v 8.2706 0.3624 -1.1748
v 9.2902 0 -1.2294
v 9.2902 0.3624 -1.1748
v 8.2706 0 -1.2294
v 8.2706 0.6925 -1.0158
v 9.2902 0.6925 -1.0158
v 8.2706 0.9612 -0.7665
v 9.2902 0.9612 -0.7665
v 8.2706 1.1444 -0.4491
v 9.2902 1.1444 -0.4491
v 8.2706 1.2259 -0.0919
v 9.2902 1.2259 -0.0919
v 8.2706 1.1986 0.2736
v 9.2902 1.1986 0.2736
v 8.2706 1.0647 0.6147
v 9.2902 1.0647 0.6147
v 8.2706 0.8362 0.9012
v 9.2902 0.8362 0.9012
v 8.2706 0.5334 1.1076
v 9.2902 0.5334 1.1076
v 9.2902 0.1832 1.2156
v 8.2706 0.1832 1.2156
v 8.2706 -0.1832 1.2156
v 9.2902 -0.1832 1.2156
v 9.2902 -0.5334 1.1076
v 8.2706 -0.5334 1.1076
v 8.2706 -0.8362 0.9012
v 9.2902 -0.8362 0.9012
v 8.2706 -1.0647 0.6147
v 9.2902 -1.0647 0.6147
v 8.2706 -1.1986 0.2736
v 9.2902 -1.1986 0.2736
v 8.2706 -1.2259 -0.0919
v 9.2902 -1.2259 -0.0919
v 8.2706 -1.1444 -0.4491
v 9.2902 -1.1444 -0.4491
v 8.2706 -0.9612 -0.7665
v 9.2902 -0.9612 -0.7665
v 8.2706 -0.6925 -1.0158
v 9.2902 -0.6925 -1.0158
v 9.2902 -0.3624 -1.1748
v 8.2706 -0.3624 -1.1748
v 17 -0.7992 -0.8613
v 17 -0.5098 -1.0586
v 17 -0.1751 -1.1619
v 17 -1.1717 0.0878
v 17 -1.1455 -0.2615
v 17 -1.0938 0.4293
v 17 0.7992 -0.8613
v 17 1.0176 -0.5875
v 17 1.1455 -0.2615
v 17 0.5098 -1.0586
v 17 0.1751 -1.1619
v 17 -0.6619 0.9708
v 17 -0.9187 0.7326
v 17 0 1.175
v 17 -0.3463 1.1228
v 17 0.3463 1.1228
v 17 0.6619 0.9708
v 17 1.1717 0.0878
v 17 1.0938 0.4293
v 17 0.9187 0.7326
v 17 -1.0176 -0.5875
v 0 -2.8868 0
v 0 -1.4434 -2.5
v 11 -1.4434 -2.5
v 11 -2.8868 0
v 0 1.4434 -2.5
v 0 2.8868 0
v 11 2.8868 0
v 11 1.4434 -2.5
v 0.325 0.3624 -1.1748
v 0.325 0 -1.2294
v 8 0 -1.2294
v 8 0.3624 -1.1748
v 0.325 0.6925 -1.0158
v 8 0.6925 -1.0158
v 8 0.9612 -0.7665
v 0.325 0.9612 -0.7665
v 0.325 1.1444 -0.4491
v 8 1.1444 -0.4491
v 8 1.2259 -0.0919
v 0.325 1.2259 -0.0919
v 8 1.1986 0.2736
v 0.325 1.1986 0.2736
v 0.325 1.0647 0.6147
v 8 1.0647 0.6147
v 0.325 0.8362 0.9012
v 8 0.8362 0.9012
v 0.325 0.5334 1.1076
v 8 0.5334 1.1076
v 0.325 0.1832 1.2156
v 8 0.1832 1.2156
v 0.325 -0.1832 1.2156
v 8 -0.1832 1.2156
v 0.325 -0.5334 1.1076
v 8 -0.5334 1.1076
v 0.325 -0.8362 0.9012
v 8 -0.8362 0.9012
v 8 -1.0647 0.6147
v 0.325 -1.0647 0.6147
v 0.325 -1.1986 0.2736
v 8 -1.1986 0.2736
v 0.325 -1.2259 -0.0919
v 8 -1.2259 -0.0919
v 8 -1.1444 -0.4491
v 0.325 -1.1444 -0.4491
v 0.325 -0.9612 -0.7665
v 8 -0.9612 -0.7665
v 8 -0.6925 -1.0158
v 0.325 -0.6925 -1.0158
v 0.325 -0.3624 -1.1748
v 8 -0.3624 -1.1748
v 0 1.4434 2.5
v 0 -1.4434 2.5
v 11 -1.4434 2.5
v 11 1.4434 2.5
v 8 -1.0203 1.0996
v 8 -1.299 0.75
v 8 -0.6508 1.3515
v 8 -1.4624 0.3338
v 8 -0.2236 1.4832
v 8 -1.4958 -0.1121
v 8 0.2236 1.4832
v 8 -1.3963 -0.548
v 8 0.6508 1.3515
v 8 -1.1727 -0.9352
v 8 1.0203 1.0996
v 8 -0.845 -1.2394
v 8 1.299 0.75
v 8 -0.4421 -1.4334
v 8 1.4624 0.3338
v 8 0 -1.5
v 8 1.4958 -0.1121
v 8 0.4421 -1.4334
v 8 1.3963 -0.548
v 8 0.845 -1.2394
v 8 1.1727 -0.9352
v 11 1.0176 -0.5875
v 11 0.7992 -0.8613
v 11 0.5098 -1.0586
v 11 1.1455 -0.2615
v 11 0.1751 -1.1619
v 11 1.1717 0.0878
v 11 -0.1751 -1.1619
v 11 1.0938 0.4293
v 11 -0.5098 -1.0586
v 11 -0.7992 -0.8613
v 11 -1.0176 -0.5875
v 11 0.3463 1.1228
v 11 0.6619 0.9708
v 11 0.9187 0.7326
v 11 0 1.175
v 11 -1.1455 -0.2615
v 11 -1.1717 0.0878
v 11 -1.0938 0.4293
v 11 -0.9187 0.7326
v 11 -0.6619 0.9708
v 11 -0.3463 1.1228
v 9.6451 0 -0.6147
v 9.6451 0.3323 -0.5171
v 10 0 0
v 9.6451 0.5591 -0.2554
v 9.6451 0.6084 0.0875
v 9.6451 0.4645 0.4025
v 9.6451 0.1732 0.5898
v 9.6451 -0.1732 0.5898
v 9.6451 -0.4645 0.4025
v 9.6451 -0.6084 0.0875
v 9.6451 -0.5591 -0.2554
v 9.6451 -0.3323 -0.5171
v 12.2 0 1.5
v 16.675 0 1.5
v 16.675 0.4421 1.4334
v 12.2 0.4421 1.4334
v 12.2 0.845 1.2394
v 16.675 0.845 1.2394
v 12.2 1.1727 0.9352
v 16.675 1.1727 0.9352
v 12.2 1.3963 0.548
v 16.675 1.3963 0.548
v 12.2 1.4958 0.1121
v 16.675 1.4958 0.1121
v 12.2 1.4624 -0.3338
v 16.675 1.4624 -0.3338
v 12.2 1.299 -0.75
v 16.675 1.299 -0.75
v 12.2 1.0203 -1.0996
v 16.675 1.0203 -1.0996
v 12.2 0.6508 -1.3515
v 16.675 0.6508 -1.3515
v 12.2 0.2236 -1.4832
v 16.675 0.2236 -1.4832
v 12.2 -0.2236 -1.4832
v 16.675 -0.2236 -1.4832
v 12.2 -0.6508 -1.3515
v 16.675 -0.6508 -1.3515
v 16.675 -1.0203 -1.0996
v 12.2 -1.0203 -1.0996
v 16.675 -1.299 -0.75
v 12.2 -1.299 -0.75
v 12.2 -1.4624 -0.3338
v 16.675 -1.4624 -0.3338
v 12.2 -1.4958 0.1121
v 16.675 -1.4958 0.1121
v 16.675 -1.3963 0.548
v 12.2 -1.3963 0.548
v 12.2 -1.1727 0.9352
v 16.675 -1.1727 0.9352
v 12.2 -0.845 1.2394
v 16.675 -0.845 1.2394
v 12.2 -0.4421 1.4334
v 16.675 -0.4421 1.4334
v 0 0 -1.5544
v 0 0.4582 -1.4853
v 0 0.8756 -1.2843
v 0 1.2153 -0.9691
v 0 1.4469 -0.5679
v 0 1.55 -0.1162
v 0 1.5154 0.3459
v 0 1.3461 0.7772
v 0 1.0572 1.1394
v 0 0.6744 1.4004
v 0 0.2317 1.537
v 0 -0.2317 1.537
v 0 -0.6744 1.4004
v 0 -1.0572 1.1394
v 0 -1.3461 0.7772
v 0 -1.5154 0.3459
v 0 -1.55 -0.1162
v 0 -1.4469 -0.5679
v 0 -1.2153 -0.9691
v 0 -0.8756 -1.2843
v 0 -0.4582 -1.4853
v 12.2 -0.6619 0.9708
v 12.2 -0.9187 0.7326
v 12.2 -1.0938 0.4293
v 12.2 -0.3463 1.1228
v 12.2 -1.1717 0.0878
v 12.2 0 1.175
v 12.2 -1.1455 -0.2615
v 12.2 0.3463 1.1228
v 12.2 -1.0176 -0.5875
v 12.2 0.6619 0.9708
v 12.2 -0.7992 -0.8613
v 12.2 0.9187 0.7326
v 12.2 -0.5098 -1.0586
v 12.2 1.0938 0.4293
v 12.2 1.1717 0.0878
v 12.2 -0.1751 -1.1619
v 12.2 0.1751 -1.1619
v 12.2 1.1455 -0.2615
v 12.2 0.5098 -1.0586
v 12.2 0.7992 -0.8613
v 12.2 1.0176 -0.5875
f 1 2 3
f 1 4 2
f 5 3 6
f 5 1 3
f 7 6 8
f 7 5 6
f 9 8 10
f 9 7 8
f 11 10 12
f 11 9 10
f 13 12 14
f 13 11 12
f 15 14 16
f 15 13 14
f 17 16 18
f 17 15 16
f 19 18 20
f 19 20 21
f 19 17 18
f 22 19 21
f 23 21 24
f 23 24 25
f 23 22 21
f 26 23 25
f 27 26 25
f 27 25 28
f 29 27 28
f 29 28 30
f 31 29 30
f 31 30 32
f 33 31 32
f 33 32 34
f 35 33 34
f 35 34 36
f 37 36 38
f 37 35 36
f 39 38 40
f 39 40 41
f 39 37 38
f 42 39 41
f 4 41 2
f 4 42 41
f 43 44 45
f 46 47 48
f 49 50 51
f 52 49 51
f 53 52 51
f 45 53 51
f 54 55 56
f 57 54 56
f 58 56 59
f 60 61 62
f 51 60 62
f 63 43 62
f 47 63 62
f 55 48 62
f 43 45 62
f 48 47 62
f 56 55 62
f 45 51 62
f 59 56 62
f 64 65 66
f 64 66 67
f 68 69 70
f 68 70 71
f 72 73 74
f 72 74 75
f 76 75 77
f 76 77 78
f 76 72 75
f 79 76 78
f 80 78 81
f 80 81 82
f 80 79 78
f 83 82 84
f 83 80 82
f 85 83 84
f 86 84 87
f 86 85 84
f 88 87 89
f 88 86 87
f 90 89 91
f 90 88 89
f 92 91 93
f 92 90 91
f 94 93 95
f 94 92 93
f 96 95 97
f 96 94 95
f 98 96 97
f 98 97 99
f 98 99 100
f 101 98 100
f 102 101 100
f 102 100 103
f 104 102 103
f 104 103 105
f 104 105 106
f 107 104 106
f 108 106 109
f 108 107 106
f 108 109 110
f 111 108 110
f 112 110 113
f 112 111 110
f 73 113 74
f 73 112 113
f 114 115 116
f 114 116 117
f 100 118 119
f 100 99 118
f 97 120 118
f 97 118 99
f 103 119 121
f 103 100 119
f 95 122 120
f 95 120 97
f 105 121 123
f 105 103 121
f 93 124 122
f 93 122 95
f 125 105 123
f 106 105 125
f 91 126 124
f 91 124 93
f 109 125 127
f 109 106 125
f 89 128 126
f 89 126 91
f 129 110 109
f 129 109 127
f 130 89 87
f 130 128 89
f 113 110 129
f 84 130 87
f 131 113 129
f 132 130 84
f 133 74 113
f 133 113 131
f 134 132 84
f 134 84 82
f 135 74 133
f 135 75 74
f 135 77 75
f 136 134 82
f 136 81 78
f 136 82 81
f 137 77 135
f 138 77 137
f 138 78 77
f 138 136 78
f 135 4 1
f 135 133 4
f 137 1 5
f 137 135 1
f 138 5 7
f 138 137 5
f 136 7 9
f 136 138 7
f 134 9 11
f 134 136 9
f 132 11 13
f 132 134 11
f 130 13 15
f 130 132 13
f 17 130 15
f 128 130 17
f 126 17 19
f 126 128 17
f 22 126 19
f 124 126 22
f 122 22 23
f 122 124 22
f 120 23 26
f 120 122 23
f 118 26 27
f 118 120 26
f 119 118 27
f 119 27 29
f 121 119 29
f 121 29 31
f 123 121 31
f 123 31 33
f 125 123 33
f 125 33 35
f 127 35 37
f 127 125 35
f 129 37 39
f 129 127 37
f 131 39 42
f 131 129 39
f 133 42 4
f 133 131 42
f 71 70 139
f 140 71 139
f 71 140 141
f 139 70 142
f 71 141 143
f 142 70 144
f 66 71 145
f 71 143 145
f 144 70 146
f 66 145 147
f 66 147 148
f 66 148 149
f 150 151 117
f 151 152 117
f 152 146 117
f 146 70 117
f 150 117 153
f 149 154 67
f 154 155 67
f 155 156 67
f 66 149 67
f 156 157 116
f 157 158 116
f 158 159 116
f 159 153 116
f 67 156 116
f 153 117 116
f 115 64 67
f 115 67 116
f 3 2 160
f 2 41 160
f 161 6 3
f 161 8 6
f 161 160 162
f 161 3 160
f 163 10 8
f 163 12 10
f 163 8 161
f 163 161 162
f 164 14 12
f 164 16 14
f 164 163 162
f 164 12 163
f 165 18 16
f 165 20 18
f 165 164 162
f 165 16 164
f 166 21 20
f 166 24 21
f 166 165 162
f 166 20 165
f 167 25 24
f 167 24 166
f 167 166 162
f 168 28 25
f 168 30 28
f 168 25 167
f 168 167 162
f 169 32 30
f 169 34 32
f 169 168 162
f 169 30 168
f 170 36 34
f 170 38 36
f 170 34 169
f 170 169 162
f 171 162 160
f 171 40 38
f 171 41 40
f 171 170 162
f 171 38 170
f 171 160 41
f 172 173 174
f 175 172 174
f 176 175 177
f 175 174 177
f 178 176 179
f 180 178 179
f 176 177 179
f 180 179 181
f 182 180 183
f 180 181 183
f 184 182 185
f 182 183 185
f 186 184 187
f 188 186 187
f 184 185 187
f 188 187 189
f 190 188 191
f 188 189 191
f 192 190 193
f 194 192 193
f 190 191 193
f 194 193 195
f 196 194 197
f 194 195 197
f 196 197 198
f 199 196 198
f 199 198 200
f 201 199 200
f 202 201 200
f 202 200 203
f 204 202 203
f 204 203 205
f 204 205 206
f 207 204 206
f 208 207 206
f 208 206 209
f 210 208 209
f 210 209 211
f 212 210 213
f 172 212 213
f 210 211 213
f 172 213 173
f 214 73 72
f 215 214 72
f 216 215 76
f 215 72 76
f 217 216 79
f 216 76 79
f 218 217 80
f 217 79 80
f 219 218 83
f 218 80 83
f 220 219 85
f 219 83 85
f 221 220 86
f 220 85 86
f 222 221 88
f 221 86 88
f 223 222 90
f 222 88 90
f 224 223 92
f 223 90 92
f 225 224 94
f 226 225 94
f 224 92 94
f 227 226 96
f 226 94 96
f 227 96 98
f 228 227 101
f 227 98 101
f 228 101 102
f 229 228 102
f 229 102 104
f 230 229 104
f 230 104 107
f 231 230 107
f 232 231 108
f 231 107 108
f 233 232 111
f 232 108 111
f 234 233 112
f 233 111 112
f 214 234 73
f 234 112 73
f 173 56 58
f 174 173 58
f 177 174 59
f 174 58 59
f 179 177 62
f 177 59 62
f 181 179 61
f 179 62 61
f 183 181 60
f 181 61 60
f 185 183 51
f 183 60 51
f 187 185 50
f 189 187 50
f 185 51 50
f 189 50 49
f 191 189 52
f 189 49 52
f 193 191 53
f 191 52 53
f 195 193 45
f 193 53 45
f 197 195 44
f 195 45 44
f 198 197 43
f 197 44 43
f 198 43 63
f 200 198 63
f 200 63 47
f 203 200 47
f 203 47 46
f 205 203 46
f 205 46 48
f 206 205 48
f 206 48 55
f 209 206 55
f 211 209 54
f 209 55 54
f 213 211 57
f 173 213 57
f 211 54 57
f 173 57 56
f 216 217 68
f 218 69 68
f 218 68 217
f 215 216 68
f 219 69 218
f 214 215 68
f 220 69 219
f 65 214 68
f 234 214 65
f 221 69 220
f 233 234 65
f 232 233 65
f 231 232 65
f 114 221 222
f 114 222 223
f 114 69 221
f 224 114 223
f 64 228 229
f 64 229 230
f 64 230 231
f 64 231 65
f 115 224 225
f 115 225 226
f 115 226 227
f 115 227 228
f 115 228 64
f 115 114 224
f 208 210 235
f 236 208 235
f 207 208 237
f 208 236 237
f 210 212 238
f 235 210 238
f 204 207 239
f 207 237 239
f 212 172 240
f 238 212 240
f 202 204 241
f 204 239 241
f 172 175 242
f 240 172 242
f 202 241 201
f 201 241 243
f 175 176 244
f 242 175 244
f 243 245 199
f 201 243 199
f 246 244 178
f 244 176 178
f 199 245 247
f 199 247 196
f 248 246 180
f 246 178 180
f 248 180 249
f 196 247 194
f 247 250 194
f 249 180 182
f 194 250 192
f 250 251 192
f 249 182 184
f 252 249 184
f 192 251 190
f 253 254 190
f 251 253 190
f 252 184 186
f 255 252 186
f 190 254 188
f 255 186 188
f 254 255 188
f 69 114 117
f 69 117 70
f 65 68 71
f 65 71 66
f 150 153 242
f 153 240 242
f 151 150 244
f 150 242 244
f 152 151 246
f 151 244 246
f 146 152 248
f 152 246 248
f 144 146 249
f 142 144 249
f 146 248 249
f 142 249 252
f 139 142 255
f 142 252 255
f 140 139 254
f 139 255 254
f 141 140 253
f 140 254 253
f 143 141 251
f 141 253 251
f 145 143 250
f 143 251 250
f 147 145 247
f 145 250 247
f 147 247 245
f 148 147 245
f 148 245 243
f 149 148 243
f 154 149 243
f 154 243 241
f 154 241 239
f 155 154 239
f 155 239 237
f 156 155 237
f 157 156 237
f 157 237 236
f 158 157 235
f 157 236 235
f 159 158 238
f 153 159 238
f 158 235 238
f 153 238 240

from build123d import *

# Parameters (mm, degrees)
BOSS_EXTRUDE1_DEPTH = 11
CHAMFER1_SIZE       = 0.325


with BuildPart() as part:
    # Sketch1 → Boss-Extrude1 (new body)
    with BuildSketch(Plane(origin=(0, 0, 0), x_dir=(0, -1, 0), z_dir=(-1, 0, 0))):
        Polygon((2.886751346, 0), (1.443375673, 2.5), (-1.443375673, 2.5), (-2.886751346, 0), (-1.443375673, -2.5), (1.443375673, -2.5), align=None)
    extrude(amount=-BOSS_EXTRUDE1_DEPTH)

    # Sketch2 → Cut-Revolve1 (revolve, cut)
    with BuildSketch(Plane.XY, mode=Mode.PRIVATE) as cut_revolve1_sk:
        Polygon((0, 1.229375), (0, 0), (9.999979987, 0), (9.2902, 1.229375), (8.270625, 1.229375), (8, 1.5), (8, 1.229375), align=None)
    revolve(cut_revolve1_sk.sketch.rotate(Axis((0, 0, 0), (1, 0, 0)), 270), axis=Axis((0, 0, 0), (1, 0, 0)), mode=Mode.SUBTRACT)

    # Sketch3 → Revolve1 (revolve)
    with BuildSketch(Plane(origin=(0, 0, 0), x_dir=(-1, 0, 0), z_dir=(0, 0, -1)), mode=Mode.PRIVATE) as revolve1_sk:
        Polygon((-17, 1.5), (-17, 0), (-11, 0), (-11, 1.175), (-12.2, 1.175), (-12.2, 1.5), align=None)
    revolve(revolve1_sk.sketch.rotate(Axis((17, 0, 0), (-1, 0, 0)), 270), axis=Axis((17, 0, 0), (-1, 0, 0)))

    # Chamfer1
    chamfer1_edges = [part.edges().sort_by_distance(p)[0] for p in [
        (0, 0, 1.229375),
        (17, 0, -1.5),
    ]]
    chamfer(chamfer1_edges, length=CHAMFER1_SIZE)


solid = part.part
